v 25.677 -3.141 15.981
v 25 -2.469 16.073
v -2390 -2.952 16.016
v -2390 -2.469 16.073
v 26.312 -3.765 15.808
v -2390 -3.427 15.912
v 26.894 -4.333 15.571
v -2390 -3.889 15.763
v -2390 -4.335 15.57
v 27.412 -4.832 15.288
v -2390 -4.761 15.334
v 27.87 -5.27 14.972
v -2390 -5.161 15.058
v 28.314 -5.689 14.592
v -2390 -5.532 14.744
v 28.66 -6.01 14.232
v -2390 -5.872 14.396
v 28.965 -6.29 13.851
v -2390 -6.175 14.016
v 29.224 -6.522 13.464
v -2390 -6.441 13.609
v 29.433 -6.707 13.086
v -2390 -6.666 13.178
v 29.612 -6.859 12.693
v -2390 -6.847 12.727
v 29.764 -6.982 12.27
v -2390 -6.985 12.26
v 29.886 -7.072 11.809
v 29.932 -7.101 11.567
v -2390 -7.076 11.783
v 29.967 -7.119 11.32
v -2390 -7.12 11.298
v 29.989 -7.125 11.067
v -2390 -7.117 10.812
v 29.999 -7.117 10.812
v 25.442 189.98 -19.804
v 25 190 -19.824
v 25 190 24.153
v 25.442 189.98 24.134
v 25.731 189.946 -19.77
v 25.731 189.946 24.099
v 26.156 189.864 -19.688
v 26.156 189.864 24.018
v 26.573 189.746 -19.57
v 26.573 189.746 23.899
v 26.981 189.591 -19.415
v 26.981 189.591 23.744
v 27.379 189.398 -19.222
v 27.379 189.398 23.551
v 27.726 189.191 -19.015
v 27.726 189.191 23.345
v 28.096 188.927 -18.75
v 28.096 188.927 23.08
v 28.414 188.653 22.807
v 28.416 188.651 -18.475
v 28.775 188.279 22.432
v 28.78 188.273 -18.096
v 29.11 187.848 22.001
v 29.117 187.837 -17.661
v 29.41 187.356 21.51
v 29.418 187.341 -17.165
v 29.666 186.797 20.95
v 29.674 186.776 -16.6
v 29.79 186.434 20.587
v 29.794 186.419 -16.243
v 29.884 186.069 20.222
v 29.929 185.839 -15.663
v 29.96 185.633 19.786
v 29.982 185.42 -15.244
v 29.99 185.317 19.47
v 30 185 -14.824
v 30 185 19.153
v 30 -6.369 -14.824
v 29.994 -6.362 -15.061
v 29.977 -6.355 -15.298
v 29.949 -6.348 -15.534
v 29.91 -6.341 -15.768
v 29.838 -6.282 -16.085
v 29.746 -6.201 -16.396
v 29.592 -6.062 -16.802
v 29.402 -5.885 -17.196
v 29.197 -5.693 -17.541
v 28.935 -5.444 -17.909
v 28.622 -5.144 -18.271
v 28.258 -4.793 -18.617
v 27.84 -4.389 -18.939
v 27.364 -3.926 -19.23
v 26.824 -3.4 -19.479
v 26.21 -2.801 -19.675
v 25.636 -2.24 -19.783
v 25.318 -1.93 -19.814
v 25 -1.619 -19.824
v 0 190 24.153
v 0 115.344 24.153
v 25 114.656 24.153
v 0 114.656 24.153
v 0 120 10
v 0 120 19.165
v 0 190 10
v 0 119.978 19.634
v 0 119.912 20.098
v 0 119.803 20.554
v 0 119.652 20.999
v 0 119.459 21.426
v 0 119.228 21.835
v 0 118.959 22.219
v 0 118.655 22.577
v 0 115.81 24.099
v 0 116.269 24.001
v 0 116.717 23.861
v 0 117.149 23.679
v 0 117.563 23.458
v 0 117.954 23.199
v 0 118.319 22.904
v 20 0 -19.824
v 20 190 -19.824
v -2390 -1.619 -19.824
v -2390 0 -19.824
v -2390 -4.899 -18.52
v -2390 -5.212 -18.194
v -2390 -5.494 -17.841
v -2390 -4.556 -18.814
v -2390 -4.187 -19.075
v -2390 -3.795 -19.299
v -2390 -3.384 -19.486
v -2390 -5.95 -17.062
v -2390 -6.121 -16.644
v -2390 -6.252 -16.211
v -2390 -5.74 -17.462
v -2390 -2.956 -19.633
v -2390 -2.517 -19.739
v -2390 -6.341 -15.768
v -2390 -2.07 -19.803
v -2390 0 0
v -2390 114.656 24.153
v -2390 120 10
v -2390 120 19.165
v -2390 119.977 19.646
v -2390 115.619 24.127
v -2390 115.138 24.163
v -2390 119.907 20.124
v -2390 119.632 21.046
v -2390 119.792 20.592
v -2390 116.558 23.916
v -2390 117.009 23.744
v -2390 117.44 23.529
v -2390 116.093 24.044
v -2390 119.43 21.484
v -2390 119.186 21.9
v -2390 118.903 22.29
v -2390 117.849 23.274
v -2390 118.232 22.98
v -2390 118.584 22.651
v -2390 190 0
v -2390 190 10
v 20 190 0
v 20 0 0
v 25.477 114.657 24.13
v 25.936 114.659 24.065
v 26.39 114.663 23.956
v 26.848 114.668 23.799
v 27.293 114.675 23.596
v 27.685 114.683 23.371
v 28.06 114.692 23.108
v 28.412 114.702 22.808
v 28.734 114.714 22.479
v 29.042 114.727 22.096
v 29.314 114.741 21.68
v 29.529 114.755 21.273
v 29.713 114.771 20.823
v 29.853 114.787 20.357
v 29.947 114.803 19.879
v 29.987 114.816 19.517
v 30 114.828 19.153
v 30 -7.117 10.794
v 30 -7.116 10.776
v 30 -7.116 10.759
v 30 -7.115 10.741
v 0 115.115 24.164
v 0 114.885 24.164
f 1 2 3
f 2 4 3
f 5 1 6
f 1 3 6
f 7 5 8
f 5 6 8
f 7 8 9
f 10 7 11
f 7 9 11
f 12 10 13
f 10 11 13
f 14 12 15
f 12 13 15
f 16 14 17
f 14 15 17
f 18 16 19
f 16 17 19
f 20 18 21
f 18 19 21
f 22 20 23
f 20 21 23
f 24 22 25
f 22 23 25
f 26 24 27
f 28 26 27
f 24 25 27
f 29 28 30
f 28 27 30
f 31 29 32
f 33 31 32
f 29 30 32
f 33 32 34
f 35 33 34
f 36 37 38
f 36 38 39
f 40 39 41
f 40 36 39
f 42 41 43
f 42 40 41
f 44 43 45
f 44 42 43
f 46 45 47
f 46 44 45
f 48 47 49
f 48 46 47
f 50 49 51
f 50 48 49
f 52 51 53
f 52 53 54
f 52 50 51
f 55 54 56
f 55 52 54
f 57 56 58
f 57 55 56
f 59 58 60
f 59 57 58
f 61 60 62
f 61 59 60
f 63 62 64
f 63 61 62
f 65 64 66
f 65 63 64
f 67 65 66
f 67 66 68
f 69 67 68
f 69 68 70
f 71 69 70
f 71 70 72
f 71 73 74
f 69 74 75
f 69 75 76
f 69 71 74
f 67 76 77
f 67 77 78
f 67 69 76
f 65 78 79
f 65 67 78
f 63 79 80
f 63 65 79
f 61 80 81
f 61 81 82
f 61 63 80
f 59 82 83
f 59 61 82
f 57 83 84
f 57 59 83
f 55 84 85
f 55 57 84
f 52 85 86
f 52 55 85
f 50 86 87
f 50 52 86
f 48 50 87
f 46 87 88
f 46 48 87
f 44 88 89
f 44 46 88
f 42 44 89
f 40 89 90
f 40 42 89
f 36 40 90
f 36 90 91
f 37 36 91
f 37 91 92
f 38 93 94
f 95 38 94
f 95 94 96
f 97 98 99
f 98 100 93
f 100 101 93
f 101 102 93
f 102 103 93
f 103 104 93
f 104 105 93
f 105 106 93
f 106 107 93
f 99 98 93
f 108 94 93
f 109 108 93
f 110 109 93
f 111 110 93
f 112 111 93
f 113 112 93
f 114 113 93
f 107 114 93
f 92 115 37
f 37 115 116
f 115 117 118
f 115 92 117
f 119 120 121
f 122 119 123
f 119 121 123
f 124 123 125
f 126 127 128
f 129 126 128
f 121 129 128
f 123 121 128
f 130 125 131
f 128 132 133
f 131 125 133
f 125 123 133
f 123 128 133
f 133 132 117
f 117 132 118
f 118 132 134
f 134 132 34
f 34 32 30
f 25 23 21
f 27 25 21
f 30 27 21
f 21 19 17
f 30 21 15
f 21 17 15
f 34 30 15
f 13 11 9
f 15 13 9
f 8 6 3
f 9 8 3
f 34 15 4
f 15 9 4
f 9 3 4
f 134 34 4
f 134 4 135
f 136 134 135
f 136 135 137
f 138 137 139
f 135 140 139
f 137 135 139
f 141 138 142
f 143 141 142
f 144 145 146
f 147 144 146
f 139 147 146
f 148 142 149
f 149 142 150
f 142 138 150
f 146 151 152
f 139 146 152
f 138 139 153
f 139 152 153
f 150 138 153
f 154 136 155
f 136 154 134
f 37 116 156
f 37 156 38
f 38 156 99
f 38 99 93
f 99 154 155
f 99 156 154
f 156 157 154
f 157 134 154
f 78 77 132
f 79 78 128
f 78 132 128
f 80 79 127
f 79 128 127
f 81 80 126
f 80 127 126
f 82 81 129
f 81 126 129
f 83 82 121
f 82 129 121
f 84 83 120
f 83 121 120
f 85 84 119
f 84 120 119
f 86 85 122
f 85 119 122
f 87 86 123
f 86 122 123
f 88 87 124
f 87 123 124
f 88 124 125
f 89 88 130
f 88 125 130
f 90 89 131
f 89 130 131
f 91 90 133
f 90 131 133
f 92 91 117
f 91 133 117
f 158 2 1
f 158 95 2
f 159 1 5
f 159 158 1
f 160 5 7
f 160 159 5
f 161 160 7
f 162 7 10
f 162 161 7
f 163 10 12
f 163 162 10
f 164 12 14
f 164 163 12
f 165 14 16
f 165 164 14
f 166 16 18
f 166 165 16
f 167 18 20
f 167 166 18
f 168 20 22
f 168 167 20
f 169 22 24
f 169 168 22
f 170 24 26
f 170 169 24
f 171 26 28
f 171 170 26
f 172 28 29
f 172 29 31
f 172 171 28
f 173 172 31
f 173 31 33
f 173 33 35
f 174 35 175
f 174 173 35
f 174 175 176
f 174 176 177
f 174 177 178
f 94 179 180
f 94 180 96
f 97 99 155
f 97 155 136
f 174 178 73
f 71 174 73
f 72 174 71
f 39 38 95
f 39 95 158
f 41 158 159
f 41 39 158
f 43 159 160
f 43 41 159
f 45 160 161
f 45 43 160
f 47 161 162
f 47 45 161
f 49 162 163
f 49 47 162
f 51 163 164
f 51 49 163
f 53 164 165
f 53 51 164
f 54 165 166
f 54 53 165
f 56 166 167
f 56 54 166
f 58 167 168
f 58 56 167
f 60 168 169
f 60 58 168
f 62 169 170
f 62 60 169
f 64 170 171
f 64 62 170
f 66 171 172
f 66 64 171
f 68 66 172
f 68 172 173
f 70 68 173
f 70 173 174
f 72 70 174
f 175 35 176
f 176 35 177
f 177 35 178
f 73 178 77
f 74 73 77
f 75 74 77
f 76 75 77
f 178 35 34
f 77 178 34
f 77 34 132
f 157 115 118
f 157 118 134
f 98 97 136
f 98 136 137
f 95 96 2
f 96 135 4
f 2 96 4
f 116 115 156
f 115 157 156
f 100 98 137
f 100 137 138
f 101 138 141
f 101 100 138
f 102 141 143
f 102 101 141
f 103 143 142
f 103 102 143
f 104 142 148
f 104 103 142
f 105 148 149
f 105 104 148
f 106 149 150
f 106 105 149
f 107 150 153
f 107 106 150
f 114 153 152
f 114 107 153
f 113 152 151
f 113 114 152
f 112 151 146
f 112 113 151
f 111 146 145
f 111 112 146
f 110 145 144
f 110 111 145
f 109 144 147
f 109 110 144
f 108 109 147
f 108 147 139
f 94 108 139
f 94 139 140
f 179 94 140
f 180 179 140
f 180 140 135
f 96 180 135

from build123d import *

# Parameters (mm, degrees)
F1_DEPTH    = 2390
F3_DEPTH    = 20
F5_DEPTH    = 10
F6_T1_DEPTH = 216.618628623
F6_T3_DEPTH = 142.4030805268
F6_T5_DEPTH = 100.344113211
F6_T7_DEPTH = 68.9770272469


# Not quite as in the source:
# - a fillet or chamfer that OpenCascade refuses, or shapes differently, is made with other operations: its cross-section is extruded or revolved along the edge and cut away or added


with BuildPart() as f1:
    # F0 (on Right) → F1 (new body)
    with BuildSketch(Plane.YZ):
        with BuildLine():
            Line((0, -19.8239199817), (0, 0))
            Line((0, 0), (190, 0))
            Line((190, 0), (190, 10))
            Line((190, 10), (120, 10))
            Line((120, 10), (120, 19.1649627105))
            ThreePointArc((120, 19.1649627105), (118.4117029432, 22.8201348033), (114.655886789, 24.1531072651))
            Line((114.655886789, 24.1531072651), (-2.4688205766, 16.0731170599))
            ThreePointArc((-2.4688205766, 16.0731170599), (-5.8715951564, 14.3956872139), (-7.1172645938, 10.8122596114))
            Line((-7.1172645938, 10.8122596114), (-6.3410848379, -15.7684031874))
            ThreePointArc((-6.3410848379, -15.7684031874), (-4.7310556973, -18.6708970152), (-1.618628623, -19.8239199817))
            Line((-1.618628623, -19.8239199817), (0, -19.8239199817))
        make_face()
    extrude(amount=-F1_DEPTH)

    # F2 (on face) → F3 (join)
    with BuildSketch(Plane.YZ):
        with BuildLine():
            ThreePointArc((-6.3410848379, -15.7684031874), (-4.7310556973, -18.6708970152), (-1.618628623, -19.8239199817))
            Line((-1.618628623, -19.8239199817), (0, -19.8239199817))
            Line((0, -19.8239199817), (0, 0))
            Line((0, 0), (190, 0))
            Line((190, 0), (190, 10))
            Line((190, 10), (120, 10))
            Line((120, 10), (120, 19.1649627105))
            ThreePointArc((120, 19.1649627105), (118.6551720927, 22.5766656537), (115.344113211, 24.1531072651))
            Line((115.344113211, 24.1531072651), (114.655886789, 24.1531072651))
            Line((114.655886789, 24.1531072651), (-2.4688205766, 16.0731170599))
            ThreePointArc((-2.4688205766, 16.0731170599), (-5.8715951564, 14.3956872139), (-7.1172645938, 10.8122596114))
            Line((-7.1172645938, 10.8122596114), (-6.3410848379, -15.7684031874))
        make_face()
        with BuildLine():
            Line((120, 10), (190, 10))
            Line((190, 10), (190, 24.1531072651))
            Line((190, 24.1531072651), (115.344113211, 24.1531072651))
            ThreePointArc((115.344113211, 24.1531072651), (118.6551720927, 22.5766656537), (120, 19.1649627105))
            Line((120, 19.1649627105), (120, 10))
        make_face()
    extrude(amount=F3_DEPTH)

    # F4 (on face) → F5 (join)
    with BuildSketch(Plane.YZ.offset(20)):
        with BuildLine():
            Line((190, -19.8239199817), (190, 0))
            Line((190, 0), (190, 24.1531072651))
            Line((190, 24.1531072651), (114.655886789, 24.1531072651))
            Line((114.655886789, 24.1531072651), (-2.4688205766, 16.0731170599))
            ThreePointArc((-2.4688205766, 16.0731170599), (-5.8715951564, 14.3956872139), (-7.1172645938, 10.8122596114))
            Line((-7.1172645938, 10.8122596114), (-6.3410848379, -15.7684031874))
            ThreePointArc((-6.3410848379, -15.7684031874), (-4.7310556973, -18.6708970152), (-1.618628623, -19.8239199817))
            Line((-1.618628623, -19.8239199817), (0, -19.8239199817))
            Line((0, -19.8239199817), (190, -19.8239199817))
        make_face()
    extrude(amount=F5_DEPTH)

    # F6: fillet of radius 5 on 4 edges, made by hand

    # F6_s2 → F6_t1 (cut)
    with BuildSketch(Plane.XZ.offset(-202.5)):
        with BuildLine():
            ThreePointArc((30, -14.8239199817), (28.5355339059, -18.3594538877), (25, -19.8239199817))
            Line((25, -19.8239199817), (30, -19.8239199817))
            Line((30, -19.8239199817), (30, -14.8239199817))
        make_face()
    extrude(amount=F6_T1_DEPTH, mode=Mode.SUBTRACT)

    # F6_s4 → F6_t3 (cut)
    with BuildSketch(Plane(origin=(0, 128.2415133818, 8.8468965716), x_dir=(1, 0, 0), z_dir=(0, -0.9976289109, -0.0688226422))):
        with BuildLine():
            ThreePointArc((25, 16.2049170229), (28.5355339059, 14.7404509288), (30, 11.2049170229))
            Line((30, 11.2049170229), (30, 16.2049170229))
            Line((30, 16.2049170229), (25, 16.2049170229))
        make_face()
    extrude(amount=F6_T3_DEPTH, mode=Mode.SUBTRACT)

    # F6_s6 → F6_t5 (cut)
    with BuildSketch(Plane.XZ.offset(-202.5)):
        with BuildLine():
            ThreePointArc((25, 24.1531072651), (28.5355339059, 22.6886411711), (30, 19.1531072651))
            Line((30, 19.1531072651), (30, 24.1531072651))
            Line((30, 24.1531072651), (25, 24.1531072651))
        make_face()
    extrude(amount=F6_T5_DEPTH, mode=Mode.SUBTRACT)

    # F6_s8 → F6_t7 (cut)
    with BuildSketch(Plane.XY.offset(-32.3239199817)):
        with BuildLine():
            ThreePointArc((25, 190), (28.5355339059, 188.5355339059), (30, 185))
            Line((30, 185), (30, 190))
            Line((30, 190), (25, 190))
        make_face()
    extrude(amount=F6_T7_DEPTH, mode=Mode.SUBTRACT)


solid = f1.part
